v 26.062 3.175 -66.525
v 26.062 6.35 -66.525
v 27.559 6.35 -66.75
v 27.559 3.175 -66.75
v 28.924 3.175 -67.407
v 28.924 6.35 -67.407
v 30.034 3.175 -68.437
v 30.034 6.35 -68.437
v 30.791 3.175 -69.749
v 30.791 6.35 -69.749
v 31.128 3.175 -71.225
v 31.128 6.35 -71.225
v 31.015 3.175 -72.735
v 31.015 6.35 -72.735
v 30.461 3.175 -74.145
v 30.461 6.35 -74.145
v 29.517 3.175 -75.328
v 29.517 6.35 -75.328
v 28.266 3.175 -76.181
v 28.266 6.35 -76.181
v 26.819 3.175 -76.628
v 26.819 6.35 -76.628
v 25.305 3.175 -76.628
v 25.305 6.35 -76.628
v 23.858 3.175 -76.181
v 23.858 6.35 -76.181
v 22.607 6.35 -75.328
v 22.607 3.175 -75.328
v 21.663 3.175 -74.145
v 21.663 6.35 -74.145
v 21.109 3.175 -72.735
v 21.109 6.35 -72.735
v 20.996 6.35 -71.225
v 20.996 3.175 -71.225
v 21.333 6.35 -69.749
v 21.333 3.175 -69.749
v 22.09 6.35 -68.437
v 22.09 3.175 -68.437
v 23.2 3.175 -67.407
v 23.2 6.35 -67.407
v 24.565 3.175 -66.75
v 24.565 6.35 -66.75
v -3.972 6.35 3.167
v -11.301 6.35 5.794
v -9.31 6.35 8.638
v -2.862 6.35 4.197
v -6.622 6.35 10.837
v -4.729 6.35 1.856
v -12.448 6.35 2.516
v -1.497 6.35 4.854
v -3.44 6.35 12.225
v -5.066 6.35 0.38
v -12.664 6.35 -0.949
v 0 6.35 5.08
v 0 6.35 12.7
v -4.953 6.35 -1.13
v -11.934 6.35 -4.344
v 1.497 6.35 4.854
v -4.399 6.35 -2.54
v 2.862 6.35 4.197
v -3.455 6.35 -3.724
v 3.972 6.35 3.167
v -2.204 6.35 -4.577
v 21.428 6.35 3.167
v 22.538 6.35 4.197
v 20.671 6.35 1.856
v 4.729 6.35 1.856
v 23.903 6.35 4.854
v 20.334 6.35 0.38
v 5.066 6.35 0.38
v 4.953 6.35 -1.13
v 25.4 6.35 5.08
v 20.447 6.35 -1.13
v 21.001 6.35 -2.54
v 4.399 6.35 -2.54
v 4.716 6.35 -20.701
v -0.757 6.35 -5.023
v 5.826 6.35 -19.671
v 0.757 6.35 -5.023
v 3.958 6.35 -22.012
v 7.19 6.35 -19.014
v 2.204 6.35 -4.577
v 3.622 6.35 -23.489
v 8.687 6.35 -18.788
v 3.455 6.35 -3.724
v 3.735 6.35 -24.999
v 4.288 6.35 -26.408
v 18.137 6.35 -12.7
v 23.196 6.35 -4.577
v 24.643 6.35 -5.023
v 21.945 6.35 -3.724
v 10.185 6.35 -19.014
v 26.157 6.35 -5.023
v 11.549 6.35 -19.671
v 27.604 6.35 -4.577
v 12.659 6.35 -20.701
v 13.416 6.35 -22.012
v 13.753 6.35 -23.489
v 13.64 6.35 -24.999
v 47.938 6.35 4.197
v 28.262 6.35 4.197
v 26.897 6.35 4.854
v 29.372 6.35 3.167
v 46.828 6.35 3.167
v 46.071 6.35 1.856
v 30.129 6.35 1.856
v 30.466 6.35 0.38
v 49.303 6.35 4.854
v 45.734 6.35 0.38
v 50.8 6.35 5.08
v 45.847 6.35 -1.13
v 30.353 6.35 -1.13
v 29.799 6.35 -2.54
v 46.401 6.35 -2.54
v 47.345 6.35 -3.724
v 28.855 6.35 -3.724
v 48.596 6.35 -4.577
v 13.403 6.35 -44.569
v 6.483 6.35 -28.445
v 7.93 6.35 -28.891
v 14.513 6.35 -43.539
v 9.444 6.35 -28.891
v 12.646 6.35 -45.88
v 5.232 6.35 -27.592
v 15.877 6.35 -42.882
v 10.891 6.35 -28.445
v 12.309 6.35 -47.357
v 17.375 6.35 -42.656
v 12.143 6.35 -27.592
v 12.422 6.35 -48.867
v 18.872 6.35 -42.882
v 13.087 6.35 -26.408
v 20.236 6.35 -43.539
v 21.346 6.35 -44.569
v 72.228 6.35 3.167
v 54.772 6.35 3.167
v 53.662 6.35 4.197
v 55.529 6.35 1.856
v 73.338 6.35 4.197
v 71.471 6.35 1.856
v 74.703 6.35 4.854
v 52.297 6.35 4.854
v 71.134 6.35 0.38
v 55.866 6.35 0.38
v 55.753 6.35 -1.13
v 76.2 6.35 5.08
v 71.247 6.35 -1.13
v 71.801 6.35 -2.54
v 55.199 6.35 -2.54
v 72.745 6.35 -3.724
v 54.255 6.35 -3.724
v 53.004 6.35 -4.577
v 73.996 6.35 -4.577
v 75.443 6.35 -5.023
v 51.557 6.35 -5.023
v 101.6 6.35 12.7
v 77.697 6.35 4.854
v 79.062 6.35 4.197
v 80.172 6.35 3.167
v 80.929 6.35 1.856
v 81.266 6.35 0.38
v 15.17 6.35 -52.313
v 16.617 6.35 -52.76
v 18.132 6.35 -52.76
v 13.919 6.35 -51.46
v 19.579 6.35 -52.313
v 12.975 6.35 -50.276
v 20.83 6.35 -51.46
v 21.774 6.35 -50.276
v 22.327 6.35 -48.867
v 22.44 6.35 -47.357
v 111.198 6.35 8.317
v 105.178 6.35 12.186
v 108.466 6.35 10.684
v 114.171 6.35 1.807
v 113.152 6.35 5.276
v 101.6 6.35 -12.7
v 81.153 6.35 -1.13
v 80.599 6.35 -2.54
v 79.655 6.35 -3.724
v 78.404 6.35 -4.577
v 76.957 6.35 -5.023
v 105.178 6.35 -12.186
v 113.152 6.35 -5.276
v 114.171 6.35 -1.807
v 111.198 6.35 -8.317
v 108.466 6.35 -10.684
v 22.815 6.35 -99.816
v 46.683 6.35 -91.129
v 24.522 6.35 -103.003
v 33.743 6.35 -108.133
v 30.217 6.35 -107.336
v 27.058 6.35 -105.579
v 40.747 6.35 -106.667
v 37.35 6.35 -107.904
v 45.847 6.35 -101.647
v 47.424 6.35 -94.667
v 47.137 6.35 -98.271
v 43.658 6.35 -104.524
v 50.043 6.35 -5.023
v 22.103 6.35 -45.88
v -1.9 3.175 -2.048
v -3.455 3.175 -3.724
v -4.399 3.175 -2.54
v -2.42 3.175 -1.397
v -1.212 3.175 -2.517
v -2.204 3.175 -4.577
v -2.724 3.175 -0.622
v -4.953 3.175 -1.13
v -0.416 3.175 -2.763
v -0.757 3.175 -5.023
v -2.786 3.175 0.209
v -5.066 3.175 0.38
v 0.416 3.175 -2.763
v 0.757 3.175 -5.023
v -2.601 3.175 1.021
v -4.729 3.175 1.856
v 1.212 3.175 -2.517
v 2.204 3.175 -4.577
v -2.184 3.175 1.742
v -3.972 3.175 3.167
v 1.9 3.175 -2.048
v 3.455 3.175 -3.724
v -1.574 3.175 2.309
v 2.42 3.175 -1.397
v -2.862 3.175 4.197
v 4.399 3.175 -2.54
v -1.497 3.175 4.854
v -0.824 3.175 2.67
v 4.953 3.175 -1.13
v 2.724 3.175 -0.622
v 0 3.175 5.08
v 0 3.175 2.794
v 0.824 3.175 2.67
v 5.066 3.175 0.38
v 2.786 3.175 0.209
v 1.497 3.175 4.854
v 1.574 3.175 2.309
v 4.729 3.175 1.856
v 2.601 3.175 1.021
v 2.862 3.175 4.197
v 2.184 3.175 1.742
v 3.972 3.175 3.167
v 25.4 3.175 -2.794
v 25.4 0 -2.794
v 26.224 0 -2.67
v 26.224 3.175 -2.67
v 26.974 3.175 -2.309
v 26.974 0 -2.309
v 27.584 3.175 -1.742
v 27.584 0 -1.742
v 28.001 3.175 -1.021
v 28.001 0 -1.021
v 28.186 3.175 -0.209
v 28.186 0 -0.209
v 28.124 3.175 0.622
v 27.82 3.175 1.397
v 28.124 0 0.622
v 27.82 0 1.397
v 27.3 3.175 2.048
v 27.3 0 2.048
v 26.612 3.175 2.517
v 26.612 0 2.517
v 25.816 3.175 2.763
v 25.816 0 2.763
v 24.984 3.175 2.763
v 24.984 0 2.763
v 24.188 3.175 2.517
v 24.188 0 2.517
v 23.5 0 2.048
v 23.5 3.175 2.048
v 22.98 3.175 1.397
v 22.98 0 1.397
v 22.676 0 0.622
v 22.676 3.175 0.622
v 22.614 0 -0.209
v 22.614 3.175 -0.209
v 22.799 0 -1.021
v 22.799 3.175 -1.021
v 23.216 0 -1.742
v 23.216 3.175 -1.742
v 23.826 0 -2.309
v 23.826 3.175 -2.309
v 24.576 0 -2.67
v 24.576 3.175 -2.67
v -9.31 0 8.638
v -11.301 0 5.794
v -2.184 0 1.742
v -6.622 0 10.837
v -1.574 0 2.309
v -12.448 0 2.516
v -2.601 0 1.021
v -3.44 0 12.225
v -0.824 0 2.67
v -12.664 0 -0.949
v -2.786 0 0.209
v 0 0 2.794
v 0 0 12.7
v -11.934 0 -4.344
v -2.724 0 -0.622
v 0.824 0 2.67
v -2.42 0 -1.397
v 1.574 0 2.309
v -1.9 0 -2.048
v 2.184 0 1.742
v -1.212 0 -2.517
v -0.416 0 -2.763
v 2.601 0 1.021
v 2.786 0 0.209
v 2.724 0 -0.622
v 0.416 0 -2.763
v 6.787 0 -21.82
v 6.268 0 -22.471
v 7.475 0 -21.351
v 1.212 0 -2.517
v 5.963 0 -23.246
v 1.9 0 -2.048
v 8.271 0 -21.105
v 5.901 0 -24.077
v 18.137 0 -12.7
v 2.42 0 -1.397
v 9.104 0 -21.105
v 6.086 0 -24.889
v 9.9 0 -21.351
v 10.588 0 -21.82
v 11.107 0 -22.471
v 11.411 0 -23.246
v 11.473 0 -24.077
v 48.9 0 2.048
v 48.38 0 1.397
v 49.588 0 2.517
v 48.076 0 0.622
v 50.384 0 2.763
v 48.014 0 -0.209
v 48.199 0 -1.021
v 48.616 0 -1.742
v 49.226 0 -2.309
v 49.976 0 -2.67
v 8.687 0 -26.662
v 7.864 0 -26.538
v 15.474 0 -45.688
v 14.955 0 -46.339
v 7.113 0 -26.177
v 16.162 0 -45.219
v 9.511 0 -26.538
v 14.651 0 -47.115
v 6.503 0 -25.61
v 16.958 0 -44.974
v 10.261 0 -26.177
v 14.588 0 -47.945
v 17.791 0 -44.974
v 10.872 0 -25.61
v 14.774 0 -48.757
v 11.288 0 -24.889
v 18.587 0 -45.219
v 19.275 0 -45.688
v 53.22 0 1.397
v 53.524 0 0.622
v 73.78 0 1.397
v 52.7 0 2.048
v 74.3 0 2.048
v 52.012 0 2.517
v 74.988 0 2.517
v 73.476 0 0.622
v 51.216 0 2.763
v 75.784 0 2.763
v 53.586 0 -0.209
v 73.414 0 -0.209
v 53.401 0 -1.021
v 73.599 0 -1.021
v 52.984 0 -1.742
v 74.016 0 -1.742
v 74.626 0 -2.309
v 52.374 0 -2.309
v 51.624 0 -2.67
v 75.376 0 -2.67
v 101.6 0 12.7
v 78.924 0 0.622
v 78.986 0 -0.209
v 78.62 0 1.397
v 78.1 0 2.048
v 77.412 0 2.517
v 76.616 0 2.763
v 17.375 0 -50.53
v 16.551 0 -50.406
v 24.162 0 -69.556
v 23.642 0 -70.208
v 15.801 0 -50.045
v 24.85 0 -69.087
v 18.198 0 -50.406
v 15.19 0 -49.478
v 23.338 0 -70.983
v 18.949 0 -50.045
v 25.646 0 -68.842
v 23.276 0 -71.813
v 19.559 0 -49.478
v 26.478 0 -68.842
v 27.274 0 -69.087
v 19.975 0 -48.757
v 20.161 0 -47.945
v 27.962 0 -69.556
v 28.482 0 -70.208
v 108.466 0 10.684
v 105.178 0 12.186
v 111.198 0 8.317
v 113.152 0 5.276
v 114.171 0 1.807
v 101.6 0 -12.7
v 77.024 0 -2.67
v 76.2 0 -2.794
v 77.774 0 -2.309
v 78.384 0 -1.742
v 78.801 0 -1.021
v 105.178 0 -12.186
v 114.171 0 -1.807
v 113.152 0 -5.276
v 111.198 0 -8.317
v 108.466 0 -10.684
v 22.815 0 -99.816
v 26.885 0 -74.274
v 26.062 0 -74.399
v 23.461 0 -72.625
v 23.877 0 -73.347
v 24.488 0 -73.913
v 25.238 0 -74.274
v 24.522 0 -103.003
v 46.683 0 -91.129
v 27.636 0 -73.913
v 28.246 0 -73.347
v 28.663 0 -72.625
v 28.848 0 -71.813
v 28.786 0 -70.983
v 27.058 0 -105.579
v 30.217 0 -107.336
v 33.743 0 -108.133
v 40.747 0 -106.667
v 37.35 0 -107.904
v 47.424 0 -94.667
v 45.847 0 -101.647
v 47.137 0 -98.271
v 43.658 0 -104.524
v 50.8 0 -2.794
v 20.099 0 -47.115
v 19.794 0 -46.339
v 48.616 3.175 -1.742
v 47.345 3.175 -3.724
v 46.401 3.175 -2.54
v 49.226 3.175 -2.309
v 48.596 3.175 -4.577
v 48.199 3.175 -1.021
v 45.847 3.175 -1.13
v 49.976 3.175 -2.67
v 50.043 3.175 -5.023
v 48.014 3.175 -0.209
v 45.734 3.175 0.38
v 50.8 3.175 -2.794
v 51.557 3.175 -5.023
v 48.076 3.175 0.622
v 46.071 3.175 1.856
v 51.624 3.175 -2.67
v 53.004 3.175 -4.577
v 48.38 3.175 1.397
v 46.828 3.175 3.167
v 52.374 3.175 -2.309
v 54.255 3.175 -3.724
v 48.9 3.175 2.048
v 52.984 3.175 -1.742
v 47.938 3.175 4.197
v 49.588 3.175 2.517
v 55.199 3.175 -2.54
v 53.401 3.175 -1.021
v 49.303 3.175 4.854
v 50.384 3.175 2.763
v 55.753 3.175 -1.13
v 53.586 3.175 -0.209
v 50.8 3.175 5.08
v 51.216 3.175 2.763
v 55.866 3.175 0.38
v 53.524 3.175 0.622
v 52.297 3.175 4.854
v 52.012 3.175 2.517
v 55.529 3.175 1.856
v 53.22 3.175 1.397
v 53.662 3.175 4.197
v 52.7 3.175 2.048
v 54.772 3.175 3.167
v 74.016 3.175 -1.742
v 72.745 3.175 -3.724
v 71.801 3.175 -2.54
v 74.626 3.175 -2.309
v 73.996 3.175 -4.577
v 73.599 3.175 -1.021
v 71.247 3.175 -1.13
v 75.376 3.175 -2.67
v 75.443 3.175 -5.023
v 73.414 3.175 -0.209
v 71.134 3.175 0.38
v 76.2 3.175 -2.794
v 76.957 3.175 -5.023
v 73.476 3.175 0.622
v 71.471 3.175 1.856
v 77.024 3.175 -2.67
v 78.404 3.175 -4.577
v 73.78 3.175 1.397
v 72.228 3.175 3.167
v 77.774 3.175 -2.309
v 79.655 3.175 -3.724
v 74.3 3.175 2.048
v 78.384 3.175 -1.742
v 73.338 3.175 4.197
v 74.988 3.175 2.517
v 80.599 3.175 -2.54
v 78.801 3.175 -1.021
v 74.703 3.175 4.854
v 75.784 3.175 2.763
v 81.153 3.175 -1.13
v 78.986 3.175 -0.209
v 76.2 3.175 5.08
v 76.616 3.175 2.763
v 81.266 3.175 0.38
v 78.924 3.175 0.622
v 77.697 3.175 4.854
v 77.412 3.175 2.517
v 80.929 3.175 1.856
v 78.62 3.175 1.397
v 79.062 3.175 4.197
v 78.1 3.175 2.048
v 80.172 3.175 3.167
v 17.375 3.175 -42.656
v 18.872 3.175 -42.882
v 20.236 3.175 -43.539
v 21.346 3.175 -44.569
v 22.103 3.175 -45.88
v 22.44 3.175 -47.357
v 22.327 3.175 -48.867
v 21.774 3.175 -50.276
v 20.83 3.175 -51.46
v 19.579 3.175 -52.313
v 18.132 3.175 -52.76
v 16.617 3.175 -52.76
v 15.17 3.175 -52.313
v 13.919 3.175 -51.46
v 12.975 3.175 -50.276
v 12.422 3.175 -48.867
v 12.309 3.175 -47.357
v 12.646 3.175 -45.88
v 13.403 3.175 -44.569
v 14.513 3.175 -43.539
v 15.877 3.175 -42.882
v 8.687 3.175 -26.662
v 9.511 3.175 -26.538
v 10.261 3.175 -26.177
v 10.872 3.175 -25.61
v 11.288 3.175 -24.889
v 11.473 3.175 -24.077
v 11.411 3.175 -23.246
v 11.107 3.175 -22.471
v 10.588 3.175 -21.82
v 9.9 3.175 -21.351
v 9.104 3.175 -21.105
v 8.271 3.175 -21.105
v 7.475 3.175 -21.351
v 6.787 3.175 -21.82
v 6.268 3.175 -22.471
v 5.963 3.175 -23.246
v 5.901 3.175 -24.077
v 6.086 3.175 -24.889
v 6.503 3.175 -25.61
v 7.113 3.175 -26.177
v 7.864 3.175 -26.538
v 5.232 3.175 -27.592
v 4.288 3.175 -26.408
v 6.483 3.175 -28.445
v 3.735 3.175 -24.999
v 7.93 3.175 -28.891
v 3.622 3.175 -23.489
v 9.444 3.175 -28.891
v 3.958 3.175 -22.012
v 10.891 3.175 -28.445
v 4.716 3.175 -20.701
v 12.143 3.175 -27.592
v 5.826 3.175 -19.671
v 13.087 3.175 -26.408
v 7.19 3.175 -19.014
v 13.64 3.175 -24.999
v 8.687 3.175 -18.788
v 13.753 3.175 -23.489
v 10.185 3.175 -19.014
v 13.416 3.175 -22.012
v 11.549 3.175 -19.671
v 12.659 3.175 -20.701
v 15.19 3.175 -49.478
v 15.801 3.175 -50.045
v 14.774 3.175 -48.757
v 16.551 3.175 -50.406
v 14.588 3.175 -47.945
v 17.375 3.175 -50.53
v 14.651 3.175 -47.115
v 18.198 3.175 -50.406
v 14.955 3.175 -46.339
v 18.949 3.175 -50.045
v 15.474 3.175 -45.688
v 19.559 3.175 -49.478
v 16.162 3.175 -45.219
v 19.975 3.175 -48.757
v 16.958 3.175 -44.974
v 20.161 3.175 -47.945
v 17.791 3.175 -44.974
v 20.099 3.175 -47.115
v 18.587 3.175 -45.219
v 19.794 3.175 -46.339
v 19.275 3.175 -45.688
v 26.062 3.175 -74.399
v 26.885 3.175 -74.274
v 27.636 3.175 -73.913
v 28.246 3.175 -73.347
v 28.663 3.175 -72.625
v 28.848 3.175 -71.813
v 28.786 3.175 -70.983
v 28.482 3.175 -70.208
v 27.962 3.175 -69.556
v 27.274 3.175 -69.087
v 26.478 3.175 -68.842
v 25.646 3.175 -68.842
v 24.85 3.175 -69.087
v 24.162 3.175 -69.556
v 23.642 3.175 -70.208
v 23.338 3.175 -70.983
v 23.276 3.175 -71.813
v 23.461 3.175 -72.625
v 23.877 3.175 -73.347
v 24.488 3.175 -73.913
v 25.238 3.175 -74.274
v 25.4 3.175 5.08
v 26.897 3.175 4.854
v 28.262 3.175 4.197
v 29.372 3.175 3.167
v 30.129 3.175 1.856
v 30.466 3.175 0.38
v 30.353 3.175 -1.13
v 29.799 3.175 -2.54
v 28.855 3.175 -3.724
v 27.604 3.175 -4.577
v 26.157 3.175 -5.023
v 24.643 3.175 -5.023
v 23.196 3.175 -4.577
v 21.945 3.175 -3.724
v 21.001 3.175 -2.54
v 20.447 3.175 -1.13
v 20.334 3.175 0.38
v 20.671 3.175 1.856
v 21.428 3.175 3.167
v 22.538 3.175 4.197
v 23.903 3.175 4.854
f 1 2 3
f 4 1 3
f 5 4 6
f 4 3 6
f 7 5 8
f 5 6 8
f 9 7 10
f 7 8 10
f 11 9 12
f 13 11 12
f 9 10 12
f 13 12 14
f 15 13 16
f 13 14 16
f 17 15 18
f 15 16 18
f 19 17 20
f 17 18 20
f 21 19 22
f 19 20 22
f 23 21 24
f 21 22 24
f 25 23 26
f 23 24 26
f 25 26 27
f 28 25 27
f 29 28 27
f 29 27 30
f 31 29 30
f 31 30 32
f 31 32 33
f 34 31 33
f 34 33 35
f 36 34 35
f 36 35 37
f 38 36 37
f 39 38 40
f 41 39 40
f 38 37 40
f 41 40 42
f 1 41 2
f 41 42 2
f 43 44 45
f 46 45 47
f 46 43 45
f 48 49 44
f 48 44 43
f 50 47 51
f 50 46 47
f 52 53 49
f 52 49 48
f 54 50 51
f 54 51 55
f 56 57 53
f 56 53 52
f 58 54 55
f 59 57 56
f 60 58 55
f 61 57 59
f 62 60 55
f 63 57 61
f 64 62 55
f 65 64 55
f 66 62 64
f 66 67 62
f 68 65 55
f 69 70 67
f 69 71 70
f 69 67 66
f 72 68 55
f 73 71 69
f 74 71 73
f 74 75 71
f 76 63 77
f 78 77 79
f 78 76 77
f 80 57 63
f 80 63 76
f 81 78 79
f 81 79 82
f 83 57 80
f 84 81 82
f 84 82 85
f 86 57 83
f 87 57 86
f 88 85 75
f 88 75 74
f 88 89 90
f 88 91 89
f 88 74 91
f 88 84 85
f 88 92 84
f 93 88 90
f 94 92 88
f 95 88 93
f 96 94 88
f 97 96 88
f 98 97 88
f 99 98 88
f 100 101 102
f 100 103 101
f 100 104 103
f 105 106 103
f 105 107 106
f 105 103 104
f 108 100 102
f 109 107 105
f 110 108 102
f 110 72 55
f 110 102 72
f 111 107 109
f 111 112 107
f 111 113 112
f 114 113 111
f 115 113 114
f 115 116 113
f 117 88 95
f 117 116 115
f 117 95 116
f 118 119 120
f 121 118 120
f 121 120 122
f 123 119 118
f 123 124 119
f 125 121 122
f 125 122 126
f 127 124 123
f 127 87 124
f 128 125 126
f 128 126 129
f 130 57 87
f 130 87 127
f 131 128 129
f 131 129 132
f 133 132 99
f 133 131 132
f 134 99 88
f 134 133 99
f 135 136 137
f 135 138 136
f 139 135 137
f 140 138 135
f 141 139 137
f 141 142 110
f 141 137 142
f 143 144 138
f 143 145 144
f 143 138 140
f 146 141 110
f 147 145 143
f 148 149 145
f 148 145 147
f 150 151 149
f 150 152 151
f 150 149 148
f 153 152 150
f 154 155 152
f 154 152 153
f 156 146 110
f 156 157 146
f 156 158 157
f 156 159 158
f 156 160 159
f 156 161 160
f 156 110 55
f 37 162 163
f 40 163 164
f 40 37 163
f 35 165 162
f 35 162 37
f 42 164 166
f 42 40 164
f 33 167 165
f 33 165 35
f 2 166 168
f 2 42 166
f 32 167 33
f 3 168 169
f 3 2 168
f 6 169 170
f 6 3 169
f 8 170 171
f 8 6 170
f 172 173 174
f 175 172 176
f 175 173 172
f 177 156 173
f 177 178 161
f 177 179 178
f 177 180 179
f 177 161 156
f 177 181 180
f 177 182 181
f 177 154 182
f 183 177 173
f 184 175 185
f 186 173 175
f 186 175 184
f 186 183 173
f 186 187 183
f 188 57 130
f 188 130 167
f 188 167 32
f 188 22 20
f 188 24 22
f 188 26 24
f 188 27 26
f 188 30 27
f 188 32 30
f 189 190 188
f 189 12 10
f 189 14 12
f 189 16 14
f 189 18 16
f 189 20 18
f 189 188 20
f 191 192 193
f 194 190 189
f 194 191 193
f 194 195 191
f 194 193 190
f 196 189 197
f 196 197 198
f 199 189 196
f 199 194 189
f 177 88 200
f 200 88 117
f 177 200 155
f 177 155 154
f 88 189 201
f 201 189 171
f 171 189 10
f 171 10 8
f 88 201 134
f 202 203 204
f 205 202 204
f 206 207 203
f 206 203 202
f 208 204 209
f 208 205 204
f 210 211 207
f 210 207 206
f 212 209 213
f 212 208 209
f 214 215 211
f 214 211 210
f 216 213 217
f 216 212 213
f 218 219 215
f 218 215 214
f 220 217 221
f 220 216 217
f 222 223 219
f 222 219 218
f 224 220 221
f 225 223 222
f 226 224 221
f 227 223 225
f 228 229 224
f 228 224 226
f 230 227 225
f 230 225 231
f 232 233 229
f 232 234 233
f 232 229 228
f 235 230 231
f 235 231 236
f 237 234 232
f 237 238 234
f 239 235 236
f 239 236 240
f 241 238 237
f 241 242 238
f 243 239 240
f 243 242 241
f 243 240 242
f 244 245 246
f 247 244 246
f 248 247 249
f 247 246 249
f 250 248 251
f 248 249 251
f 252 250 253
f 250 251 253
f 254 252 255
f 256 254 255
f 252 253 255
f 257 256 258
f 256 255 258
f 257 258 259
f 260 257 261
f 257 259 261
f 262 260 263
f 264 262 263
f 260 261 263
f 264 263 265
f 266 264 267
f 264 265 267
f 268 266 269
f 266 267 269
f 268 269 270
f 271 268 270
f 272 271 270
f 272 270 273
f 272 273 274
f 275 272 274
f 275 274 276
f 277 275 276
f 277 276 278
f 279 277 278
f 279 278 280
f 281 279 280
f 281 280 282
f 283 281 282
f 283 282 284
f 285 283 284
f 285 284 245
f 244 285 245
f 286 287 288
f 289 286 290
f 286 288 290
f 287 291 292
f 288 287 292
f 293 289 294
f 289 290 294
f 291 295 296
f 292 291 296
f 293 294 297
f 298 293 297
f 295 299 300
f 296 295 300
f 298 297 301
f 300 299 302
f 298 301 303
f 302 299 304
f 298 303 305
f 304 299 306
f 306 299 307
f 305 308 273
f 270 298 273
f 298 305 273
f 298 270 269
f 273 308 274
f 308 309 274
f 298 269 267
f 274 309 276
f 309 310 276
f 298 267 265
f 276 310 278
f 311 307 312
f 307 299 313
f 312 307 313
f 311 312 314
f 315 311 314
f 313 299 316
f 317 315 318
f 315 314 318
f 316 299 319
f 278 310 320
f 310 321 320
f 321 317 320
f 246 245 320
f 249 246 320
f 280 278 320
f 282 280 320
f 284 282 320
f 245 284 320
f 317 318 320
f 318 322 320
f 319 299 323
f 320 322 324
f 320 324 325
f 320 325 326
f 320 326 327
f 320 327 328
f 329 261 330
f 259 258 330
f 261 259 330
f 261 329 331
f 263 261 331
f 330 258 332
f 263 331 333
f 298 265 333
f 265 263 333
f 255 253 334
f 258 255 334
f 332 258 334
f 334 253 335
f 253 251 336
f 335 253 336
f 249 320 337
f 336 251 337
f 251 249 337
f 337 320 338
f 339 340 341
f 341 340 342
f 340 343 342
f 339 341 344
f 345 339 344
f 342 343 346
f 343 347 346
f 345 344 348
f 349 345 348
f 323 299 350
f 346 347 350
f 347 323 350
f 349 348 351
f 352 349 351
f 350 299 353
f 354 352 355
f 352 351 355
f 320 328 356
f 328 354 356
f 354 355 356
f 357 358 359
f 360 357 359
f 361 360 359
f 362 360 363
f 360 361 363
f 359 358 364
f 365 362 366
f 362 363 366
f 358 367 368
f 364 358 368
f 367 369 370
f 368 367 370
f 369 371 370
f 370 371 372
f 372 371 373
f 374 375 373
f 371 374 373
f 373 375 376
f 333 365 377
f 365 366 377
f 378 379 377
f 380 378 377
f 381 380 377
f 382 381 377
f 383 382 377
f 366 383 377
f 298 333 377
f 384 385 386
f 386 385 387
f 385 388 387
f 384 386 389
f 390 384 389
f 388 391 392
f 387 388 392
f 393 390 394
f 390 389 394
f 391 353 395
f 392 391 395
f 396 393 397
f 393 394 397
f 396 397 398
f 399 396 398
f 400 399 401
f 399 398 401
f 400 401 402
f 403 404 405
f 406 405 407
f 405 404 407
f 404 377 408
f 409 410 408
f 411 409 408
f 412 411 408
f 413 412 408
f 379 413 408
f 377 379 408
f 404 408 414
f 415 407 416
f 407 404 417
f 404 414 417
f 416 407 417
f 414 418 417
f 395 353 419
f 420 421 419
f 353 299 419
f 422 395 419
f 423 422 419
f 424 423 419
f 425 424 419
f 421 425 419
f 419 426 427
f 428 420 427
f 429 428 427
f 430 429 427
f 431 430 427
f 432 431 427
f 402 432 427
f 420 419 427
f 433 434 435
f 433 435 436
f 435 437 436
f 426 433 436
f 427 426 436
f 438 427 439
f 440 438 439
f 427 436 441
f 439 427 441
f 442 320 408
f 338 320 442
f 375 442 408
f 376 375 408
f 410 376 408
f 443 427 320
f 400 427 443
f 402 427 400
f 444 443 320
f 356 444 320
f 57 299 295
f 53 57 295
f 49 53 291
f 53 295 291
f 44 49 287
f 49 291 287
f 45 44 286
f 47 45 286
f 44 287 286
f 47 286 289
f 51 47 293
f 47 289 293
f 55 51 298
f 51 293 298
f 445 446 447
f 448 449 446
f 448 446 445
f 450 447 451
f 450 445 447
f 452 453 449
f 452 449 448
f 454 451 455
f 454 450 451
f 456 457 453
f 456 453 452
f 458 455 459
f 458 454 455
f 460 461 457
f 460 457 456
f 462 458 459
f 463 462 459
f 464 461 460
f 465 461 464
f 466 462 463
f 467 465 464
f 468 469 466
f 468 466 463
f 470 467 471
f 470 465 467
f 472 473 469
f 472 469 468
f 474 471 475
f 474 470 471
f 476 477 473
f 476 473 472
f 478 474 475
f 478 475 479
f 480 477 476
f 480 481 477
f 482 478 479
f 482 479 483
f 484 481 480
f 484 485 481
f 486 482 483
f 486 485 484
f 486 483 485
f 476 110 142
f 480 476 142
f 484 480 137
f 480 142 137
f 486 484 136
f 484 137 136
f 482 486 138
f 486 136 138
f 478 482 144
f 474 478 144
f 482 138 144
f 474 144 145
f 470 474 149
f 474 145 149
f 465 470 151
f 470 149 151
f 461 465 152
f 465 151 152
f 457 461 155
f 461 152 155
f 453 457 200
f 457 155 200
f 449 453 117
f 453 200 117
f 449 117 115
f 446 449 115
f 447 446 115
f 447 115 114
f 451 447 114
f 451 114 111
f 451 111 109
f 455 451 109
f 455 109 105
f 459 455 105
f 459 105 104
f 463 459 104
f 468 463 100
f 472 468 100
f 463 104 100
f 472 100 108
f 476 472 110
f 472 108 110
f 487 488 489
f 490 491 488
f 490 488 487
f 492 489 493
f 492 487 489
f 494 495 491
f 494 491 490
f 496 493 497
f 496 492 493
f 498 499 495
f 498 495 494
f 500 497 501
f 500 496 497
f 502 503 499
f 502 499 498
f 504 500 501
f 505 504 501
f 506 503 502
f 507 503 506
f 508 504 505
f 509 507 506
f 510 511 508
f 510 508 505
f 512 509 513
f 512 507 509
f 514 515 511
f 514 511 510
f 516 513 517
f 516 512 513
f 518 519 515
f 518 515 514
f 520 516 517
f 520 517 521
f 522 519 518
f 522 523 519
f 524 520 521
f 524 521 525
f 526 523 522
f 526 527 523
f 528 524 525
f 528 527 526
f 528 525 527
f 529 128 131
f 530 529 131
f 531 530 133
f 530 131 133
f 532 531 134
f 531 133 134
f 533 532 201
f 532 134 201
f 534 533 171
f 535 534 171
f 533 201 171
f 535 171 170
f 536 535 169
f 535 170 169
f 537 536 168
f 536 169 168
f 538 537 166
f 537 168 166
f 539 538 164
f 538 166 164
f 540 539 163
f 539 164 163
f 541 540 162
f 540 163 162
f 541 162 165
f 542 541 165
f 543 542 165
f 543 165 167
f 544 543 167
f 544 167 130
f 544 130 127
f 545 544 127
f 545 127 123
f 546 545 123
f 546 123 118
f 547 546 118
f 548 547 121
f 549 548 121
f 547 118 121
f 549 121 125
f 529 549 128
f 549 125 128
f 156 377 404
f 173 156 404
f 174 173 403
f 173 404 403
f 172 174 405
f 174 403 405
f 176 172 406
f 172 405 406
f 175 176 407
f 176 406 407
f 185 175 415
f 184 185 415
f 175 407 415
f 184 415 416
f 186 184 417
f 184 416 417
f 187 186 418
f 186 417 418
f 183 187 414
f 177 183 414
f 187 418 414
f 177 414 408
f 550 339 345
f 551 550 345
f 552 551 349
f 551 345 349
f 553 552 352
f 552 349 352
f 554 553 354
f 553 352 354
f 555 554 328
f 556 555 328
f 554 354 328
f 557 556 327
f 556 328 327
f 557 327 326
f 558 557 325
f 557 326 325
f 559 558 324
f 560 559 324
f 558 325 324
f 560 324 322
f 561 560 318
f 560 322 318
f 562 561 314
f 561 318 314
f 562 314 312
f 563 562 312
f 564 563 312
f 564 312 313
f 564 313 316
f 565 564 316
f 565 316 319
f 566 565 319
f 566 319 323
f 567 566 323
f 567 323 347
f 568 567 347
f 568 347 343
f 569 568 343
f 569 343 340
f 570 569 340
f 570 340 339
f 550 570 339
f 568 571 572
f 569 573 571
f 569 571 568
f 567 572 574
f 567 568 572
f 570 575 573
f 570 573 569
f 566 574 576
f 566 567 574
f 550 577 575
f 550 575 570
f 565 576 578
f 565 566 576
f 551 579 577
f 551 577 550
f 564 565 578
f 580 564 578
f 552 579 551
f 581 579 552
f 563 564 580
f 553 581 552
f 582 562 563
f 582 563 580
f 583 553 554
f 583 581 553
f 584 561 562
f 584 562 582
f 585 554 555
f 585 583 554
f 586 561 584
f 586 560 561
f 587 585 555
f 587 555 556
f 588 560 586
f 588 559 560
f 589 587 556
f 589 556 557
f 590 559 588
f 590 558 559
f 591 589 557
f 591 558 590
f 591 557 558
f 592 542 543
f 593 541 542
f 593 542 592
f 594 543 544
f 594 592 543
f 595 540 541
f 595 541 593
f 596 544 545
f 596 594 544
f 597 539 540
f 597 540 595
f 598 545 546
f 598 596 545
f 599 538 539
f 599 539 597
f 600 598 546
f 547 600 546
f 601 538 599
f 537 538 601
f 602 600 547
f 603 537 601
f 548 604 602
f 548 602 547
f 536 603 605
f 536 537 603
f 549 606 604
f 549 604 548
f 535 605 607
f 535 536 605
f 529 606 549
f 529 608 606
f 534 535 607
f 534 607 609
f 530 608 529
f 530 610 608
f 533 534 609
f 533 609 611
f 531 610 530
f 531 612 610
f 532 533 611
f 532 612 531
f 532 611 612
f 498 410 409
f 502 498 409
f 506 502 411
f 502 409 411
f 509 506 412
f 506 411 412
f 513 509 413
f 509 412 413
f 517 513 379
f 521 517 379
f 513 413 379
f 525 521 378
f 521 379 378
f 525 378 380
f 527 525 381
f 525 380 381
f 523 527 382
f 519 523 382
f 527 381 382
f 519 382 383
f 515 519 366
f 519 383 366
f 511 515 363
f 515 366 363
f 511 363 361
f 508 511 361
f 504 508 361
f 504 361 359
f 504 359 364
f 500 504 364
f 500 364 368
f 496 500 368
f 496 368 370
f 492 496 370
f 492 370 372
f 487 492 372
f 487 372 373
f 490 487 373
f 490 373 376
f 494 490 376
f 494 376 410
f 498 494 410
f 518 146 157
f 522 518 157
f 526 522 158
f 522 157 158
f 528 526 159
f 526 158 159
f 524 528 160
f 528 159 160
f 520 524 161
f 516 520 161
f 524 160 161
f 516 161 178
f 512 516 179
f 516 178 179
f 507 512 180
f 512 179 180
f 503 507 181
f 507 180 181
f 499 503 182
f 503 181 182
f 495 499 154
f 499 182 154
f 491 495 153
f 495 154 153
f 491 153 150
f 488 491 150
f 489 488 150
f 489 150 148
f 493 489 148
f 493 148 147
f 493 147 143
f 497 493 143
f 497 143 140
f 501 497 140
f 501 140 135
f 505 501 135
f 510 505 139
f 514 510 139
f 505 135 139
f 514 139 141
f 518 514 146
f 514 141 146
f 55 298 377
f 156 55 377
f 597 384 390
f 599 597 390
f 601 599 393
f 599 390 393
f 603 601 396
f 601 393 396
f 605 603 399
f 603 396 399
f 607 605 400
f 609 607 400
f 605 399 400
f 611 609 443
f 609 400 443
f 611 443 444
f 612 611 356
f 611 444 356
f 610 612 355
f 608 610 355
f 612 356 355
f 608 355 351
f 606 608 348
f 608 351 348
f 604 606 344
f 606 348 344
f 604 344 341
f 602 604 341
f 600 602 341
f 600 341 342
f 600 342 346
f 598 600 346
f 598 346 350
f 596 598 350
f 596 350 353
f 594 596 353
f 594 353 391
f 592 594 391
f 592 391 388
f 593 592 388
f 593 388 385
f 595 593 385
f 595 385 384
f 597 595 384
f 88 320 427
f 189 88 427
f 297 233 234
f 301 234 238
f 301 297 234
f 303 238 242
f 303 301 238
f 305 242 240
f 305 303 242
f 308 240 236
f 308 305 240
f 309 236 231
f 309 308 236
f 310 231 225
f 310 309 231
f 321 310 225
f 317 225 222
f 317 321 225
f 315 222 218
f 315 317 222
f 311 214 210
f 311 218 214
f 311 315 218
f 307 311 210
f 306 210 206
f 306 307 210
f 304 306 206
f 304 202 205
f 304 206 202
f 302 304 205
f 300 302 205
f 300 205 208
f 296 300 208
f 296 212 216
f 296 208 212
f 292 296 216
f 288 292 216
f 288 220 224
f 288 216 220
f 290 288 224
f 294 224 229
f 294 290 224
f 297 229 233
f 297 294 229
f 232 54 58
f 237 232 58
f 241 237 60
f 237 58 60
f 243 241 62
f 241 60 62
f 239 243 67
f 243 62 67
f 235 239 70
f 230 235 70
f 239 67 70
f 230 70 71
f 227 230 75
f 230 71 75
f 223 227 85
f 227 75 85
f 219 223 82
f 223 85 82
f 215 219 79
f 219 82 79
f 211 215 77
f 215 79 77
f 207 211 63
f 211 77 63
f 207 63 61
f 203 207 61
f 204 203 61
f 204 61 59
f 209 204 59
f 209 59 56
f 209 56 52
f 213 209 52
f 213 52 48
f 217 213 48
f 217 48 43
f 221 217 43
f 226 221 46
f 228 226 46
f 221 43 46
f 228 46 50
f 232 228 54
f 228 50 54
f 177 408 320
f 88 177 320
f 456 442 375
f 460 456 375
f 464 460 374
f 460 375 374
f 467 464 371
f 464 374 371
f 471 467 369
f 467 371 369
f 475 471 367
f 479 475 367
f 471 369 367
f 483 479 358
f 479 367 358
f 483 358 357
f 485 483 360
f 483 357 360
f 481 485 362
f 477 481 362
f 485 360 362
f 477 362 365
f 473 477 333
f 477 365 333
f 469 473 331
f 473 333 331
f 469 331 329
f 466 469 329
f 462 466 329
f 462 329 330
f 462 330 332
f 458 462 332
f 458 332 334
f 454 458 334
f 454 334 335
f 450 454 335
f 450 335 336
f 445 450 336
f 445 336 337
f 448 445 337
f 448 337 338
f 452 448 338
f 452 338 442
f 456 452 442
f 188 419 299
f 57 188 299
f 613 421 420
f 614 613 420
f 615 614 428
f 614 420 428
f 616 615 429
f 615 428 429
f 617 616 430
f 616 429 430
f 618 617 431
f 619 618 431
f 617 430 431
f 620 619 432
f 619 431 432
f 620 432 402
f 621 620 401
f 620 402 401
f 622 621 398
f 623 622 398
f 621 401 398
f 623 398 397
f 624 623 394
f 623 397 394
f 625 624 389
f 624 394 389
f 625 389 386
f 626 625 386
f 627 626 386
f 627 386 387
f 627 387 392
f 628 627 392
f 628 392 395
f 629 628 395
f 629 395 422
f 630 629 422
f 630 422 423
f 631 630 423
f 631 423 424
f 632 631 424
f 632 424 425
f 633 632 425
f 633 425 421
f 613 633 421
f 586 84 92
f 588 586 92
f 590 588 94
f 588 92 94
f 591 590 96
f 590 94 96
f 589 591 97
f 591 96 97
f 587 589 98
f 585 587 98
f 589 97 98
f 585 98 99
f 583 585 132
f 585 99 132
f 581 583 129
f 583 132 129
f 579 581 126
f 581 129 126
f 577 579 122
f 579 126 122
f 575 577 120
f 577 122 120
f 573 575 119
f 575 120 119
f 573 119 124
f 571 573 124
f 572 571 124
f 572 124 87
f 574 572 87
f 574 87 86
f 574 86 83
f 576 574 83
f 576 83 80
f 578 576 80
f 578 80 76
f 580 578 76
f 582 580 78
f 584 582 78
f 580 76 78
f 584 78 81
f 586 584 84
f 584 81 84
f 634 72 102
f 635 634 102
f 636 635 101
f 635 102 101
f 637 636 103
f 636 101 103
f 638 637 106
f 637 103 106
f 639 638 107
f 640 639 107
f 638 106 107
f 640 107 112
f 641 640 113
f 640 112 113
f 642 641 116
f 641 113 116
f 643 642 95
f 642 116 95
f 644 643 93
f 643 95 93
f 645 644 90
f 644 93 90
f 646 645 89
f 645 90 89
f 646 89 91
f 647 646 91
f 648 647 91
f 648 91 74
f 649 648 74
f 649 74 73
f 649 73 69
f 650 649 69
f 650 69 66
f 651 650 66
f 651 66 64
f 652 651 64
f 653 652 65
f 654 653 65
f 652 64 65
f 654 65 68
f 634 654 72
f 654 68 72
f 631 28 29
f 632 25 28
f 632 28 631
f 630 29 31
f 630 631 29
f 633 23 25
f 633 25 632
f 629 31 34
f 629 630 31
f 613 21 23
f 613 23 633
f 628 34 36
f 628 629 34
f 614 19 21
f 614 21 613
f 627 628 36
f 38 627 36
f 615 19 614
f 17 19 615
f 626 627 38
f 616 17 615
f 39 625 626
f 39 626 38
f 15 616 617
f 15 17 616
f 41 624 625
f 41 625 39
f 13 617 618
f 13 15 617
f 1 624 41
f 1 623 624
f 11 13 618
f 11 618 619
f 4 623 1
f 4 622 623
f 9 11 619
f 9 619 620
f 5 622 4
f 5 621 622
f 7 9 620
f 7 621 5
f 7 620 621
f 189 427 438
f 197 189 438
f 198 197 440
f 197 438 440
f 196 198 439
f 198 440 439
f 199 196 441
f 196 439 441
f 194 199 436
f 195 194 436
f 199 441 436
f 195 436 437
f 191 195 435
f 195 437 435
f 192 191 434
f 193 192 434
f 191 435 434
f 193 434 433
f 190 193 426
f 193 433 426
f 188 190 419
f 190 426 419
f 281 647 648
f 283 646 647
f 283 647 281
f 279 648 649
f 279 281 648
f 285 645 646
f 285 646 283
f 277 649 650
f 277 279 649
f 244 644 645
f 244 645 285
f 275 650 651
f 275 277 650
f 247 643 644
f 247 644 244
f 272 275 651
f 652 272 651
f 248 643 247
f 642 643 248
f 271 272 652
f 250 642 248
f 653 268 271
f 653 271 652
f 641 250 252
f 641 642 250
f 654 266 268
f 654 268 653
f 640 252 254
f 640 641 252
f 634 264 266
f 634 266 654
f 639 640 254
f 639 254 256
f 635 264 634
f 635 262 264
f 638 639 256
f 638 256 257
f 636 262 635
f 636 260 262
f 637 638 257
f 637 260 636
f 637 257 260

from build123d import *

# Parameters (mm, degrees)
SKETCH5_R            = 2.794
BOSS_EXTRUDE21_DEPTH = 6.35
SKETCH6_R            = 2.794
CUT_EXTRUDE3_DEPTH   = 6.35
SKETCH7_R            = 5.08
CUT_EXTRUDE4_DEPTH   = 3.175


with BuildPart() as part:
    # Sketch5 → Boss-Extrude21 (new body)
    # profile 1 of 3: a face of its own
    with BuildSketch(Plane(origin=(0, 0, 0), x_dir=(1, 0, 0), z_dir=(0, 1, 0))):
        with BuildLine():
            Line((101.6, 12.7), (18.137479686, 12.7))
            Line((18.137479686, 12.7), (11.934096284, -4.34365582))
            ThreePointArc((11.934096284, -4.34365582), (7.284420742, -10.403230962), (0, -12.7))
            Line((0, -12.7), (101.6, -12.7))
            ThreePointArc((101.6, -12.7), (114.3, 0), (101.6, 12.7))
        make_face()
    # profile 2 of 3: a face of its own
    with BuildSketch(Plane(origin=(0, 0, 0), x_dir=(1, 0, 0), z_dir=(0, 1, 0))):
        with BuildLine():
            ThreePointArc((-11.934096284, 4.34365582), (-7.284420742, 10.403230962), (0, 12.7))
            Line((0, 12.7), (18.137479686, 12.7))
            Line((18.137479686, 12.7), (46.683342846, 91.129114452))
            ThreePointArc((46.683342846, 91.129114452), (39.092902382, 107.406866556), (22.815150278, 99.816426092))
            Line((22.815150278, 99.816426092), (-11.934096284, 4.34365582))
        make_face()
    # profile 3 of 3: a face of its own
    with BuildSketch(Plane(origin=(0, 0, 0), x_dir=(1, 0, 0), z_dir=(0, 1, 0))):
        with BuildLine():
            Line((18.137479686, 12.7), (0, 12.7))
            ThreePointArc((0, 12.7), (-7.284420742, 10.403230962), (-11.934096284, 4.34365582))
            ThreePointArc((-11.934096284, 4.34365582), (-10.403230962, -7.284420742), (0, -12.7))
            ThreePointArc((0, -12.7), (7.284420742, -10.403230962), (11.934096284, -4.34365582))
            Line((11.934096284, -4.34365582), (18.137479686, 12.7))
        make_face()
        with Locations(Location((0, 0, 0), (0, 0, 270))):
            Circle(SKETCH5_R, mode=Mode.SUBTRACT)
    extrude(amount=BOSS_EXTRUDE21_DEPTH)

    # Sketch6 → Cut-Extrude3 (cut)
    with BuildSketch(Plane(origin=(0, 0, 0), x_dir=(-1, 0, 0), z_dir=(0, -1, 0))):
        with Locations(Location((-50.8, 0, 0), (0, 0, 90))):
            Circle(SKETCH6_R)
        with Locations(Location((-17.374623281, 47.736385136, 0), (0, 0, 90))):
            Circle(SKETCH6_R)
        with Locations(Location((-25.4, 0, 0), (0, 0, 90))):
            Circle(SKETCH6_R)
        with Locations(Location((-76.2, 0, 0), (0, 0, 90))):
            Circle(SKETCH6_R)
        with Locations(Location((-8.68731164, 23.868192568, 0), (0, 0, 90))):
            Circle(SKETCH6_R)
        with Locations(Location((-26.061934921, 71.604577704, 0), (0, 0, 90))):
            Circle(SKETCH6_R)
    extrude(amount=-CUT_EXTRUDE3_DEPTH, mode=Mode.SUBTRACT)

    # Sketch7 → Cut-Extrude4 (cut)
    with BuildSketch(Plane(origin=(0, 6.35, 0), x_dir=(1, 0, 0), z_dir=(0, 1, 0))):
        with Locations(Location((26.061934921, 71.604577704, 0), (0, 0, 270))):
            Circle(SKETCH7_R)
        with Locations(Location((17.374623281, 47.736385136, 0), (0, 0, 270))):
            Circle(SKETCH7_R)
        with Locations(Location((8.68731164, 23.868192568, 0), (0, 0, 270))):
            Circle(SKETCH7_R)
        with Locations(Location((0, 0, 0), (0, 0, 270))):
            Circle(SKETCH7_R)
        with Locations(Location((25.4, 0, 0), (0, 0, 270))):
            Circle(SKETCH7_R)
        with Locations(Location((50.8, 0, 0), (0, 0, 270))):
            Circle(SKETCH7_R)
        with Locations(Location((76.2, 0, 0), (0, 0, 270))):
            Circle(SKETCH7_R)
    extrude(amount=-CUT_EXTRUDE4_DEPTH, mode=Mode.SUBTRACT)


solid = part.part
